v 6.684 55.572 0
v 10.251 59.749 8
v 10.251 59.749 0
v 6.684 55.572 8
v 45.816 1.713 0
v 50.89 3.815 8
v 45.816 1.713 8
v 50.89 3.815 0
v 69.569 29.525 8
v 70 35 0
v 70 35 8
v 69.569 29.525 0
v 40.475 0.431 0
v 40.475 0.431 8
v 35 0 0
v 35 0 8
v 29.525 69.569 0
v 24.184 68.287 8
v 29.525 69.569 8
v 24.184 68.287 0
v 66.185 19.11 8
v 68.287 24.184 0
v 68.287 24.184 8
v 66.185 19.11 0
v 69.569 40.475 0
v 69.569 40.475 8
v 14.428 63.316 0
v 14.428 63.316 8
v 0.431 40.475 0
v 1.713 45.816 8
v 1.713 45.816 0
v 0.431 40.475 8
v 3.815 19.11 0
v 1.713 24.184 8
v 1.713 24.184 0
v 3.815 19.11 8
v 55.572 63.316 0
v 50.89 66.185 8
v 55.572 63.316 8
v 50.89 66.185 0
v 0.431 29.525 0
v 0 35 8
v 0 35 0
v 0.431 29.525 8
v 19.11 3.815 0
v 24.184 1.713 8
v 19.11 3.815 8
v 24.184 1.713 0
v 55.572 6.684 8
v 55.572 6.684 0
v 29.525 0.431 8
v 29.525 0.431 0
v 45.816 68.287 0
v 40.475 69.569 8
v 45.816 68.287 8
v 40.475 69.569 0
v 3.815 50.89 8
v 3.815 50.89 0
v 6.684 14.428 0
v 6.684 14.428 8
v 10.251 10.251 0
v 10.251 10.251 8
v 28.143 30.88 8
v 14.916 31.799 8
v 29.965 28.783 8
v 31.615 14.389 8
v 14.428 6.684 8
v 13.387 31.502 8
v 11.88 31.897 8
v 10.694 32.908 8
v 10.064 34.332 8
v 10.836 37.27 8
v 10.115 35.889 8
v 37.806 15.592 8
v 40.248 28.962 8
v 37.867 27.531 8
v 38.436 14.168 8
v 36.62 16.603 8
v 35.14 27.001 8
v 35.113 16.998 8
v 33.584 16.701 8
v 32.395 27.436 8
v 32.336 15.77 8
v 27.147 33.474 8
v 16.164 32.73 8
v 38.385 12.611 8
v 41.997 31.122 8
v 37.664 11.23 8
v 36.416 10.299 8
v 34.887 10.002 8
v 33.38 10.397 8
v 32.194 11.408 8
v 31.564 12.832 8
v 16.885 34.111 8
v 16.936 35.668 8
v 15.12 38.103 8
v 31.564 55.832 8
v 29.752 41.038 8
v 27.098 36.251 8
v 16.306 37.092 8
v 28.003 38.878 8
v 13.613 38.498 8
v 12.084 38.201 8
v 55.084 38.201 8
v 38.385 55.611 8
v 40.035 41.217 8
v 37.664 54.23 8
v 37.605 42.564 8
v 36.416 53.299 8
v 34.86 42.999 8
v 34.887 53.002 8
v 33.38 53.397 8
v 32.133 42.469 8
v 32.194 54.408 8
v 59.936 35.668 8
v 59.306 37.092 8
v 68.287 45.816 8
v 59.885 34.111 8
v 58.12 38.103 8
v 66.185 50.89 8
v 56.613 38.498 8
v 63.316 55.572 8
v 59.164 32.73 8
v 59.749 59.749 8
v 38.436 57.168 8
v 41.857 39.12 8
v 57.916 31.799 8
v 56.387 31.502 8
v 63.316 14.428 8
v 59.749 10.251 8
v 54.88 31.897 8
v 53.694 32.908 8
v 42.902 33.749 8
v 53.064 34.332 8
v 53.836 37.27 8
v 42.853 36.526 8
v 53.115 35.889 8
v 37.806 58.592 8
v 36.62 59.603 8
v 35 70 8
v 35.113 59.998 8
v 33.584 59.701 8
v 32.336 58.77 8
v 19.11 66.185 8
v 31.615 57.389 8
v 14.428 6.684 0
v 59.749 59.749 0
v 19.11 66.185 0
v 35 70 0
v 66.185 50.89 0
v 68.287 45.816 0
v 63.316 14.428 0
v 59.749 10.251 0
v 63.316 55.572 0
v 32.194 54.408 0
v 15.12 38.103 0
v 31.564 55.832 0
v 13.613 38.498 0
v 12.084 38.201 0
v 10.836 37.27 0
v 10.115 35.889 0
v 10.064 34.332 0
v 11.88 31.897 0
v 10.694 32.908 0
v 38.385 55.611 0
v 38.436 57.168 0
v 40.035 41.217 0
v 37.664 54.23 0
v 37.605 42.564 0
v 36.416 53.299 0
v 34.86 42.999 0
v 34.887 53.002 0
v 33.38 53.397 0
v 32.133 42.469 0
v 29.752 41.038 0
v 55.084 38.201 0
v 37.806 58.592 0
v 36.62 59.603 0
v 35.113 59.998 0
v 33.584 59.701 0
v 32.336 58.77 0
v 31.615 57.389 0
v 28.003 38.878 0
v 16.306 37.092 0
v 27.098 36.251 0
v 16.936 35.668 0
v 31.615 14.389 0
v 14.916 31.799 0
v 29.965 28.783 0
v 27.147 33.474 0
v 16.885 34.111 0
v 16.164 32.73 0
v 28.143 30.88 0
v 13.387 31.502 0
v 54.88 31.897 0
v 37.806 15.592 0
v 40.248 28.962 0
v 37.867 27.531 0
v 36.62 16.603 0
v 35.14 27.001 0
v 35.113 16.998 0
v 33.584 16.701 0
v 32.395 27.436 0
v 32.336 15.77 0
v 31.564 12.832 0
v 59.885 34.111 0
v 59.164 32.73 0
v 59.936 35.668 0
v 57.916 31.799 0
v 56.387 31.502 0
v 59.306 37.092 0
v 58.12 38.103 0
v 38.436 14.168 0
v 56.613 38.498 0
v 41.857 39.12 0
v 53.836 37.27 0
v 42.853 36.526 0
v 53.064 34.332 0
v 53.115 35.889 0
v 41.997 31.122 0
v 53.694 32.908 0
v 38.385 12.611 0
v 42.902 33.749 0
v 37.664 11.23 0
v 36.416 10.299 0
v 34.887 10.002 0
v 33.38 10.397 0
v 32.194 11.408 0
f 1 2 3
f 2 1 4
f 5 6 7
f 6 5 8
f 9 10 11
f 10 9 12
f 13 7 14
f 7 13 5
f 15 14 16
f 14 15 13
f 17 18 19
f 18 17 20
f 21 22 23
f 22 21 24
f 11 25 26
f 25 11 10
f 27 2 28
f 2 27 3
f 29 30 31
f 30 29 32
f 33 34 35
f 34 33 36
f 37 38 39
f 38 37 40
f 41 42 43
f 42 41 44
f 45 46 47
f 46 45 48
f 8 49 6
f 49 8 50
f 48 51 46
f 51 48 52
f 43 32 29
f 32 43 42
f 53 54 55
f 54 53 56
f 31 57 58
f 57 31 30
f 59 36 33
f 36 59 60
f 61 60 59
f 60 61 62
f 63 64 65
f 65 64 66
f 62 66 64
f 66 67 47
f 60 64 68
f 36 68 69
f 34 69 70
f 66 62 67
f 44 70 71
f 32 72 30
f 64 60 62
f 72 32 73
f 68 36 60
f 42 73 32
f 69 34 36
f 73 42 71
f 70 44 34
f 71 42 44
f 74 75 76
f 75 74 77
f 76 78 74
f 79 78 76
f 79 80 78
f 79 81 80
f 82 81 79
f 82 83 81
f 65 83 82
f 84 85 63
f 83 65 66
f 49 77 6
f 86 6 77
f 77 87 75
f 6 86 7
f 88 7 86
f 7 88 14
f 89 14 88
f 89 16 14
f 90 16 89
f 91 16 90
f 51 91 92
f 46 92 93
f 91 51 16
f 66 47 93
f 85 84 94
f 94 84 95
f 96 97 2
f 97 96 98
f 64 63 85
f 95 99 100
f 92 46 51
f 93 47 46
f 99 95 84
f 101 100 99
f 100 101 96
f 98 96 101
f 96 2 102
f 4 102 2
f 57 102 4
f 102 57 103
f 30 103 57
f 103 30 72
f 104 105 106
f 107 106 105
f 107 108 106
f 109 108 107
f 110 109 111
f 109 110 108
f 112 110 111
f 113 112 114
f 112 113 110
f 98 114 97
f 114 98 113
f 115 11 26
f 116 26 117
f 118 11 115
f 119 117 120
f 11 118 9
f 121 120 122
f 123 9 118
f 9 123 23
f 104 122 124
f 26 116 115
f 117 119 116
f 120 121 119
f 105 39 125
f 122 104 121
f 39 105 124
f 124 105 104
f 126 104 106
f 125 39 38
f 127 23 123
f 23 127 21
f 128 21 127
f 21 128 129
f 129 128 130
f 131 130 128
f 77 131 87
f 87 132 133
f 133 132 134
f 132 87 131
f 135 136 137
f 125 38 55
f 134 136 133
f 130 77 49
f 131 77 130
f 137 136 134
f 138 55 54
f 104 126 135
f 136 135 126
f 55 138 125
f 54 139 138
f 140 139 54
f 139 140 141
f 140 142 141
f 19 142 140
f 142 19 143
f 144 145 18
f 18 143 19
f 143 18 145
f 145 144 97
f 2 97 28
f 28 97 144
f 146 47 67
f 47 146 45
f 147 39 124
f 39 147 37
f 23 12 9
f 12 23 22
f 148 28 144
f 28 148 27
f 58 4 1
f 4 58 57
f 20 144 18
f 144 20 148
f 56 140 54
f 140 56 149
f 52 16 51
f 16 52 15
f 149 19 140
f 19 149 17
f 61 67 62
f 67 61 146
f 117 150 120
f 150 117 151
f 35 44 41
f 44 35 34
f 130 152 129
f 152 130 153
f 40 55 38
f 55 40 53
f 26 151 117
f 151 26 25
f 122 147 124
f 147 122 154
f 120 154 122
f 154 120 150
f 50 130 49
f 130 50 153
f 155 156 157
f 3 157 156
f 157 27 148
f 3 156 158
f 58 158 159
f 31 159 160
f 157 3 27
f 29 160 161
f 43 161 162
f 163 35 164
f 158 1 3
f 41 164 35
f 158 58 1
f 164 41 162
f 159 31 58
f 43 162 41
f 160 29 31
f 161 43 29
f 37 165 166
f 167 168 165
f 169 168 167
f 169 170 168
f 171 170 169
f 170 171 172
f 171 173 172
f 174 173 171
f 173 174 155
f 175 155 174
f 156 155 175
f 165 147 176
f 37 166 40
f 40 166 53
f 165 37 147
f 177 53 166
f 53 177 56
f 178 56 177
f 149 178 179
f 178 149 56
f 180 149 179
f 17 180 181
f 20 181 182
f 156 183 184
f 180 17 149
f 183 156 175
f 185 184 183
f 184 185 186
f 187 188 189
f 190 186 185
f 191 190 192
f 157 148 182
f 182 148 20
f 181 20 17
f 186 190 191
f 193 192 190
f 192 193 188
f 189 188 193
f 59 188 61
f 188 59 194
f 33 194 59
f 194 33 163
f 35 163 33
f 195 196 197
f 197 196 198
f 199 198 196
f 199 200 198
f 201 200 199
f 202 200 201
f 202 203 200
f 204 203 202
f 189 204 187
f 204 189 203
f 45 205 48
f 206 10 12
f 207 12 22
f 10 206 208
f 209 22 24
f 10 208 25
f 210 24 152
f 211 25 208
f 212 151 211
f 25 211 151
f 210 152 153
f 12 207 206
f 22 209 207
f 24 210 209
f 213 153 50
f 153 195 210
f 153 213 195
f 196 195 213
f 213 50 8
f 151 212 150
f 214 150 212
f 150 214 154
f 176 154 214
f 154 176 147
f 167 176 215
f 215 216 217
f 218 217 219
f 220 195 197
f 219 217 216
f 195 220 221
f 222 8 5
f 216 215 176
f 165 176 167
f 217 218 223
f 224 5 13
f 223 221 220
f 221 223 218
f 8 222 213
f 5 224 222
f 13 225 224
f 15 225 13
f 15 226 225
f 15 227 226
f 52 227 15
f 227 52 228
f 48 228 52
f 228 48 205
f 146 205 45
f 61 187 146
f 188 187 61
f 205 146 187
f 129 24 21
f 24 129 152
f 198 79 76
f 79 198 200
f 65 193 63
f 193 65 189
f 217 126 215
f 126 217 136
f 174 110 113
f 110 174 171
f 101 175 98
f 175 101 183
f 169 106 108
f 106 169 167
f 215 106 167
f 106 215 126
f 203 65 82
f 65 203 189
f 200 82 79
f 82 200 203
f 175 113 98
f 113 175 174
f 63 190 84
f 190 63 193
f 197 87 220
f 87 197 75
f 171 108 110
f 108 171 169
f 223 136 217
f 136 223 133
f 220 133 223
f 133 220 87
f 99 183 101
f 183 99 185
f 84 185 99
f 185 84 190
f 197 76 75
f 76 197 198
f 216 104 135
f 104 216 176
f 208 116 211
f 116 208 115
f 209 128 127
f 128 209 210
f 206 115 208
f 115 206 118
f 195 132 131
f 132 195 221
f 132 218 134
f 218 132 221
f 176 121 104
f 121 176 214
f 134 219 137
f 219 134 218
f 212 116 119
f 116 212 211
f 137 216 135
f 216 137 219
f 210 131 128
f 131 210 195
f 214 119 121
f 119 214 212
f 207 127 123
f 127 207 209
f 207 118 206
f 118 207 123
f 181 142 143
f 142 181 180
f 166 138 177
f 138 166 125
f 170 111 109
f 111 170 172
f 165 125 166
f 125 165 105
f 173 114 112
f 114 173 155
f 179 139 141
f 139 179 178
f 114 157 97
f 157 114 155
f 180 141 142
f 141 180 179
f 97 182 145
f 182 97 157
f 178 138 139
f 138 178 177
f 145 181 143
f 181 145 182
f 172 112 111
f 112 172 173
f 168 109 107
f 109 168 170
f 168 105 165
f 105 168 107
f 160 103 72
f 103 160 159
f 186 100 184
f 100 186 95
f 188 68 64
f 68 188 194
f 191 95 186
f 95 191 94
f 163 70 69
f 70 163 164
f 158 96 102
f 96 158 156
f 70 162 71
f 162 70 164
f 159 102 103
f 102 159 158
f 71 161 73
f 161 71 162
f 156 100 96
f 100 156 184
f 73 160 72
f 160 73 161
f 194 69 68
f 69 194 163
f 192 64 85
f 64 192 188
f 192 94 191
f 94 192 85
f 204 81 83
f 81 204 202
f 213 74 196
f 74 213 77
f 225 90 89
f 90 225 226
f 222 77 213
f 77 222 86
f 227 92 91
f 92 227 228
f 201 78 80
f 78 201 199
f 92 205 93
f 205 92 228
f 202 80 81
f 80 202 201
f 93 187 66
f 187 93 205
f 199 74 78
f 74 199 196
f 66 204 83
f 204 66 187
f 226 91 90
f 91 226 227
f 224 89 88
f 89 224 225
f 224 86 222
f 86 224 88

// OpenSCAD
$fn = 32;

// ----------------------------------------------------------------------
// Spacer plate: round flange R35, 4 bolts
// ----------------------------------------------------------------------

// --- parameters (mm) ---
bore_r = 8;               // centre bore radius
bolt_r = 3.5;             // bolt hole radius
plate_t = 8;              // plate thickness, Z (extrusion height)
flange_r = 35;            // flange radius
n_bolt = 4;               // bolt hole count
ring_r = 21.5;            // bolt circle radius
fit_tol = 0.05;           // declared fit tolerance (prompt contract)
free_tol = 0.2;           // declared free tolerance (prompt contract)

profile = [[70, 35], [69.569, 40.475], [68.287, 45.816], [66.185, 50.89], [63.316, 55.572], [59.749, 59.749], [55.572, 63.316], [50.89, 66.185], [45.816, 68.287], [40.475, 69.569], [35, 70], [29.525, 69.569], [24.184, 68.287], [19.11, 66.185], [14.428, 63.316], [10.251, 59.749], [6.684, 55.572], [3.815, 50.89], [1.713, 45.816], [0.431, 40.475], [0, 35], [0.431, 29.525], [1.713, 24.184], [3.815, 19.11], [6.684, 14.428], [10.251, 10.251], [14.428, 6.684], [19.11, 3.815], [24.184, 1.713], [29.525, 0.431], [35, 0], [40.475, 0.431], [45.816, 1.713], [50.89, 3.815], [55.572, 6.684], [59.749, 10.251], [63.316, 14.428], [66.185, 19.11], [68.287, 24.184], [69.569, 29.525]];  // primary outline, 40 points, counter clockwise
void_1 = [[42.853, 36.526], [41.857, 39.12], [40.035, 41.217], [37.605, 42.564], [34.86, 42.999], [32.133, 42.469], [29.752, 41.038], [28.003, 38.878], [27.098, 36.251], [27.147, 33.474], [28.143, 30.88], [29.965, 28.783], [32.395, 27.436], [35.14, 27.001], [37.867, 27.531], [40.248, 28.962], [41.997, 31.122], [42.902, 33.749]];  // centre bore, 18 points
void_2 = [[59.936, 35.668], [59.306, 37.092], [58.12, 38.103], [56.613, 38.498], [55.084, 38.201], [53.836, 37.27], [53.115, 35.889], [53.064, 34.332], [53.694, 32.908], [54.88, 31.897], [56.387, 31.502], [57.916, 31.799], [59.164, 32.73], [59.885, 34.111]];  // bolt hole 1, 14 points
void_3 = [[38.436, 57.168], [37.806, 58.592], [36.62, 59.603], [35.113, 59.998], [33.584, 59.701], [32.336, 58.77], [31.615, 57.389], [31.564, 55.832], [32.194, 54.408], [33.38, 53.397], [34.887, 53.002], [36.416, 53.299], [37.664, 54.23], [38.385, 55.611]];  // bolt hole 2, 14 points
void_4 = [[16.936, 35.668], [16.306, 37.092], [15.12, 38.103], [13.613, 38.498], [12.084, 38.201], [10.836, 37.27], [10.115, 35.889], [10.064, 34.332], [10.694, 32.908], [11.88, 31.897], [13.387, 31.502], [14.916, 31.799], [16.164, 32.73], [16.885, 34.111]];  // bolt hole 3, 14 points
void_5 = [[38.436, 14.168], [37.806, 15.592], [36.62, 16.603], [35.113, 16.998], [33.584, 16.701], [32.336, 15.77], [31.615, 14.389], [31.564, 12.832], [32.194, 11.408], [33.38, 10.397], [34.887, 10.002], [36.416, 10.299], [37.664, 11.23], [38.385, 12.611]];  // bolt hole 4, 14 points

// --- the one profile operation ---
difference() {
  linear_extrude(height = plate_t) polygon(points = profile);
  translate([0, 0, -1])
    linear_extrude(height = plate_t + 2) polygon(points = void_1);
  translate([0, 0, -1])
    linear_extrude(height = plate_t + 2) polygon(points = void_2);
  translate([0, 0, -1])
    linear_extrude(height = plate_t + 2) polygon(points = void_3);
  translate([0, 0, -1])
    linear_extrude(height = plate_t + 2) polygon(points = void_4);
  translate([0, 0, -1])
    linear_extrude(height = plate_t + 2) polygon(points = void_5);
}
